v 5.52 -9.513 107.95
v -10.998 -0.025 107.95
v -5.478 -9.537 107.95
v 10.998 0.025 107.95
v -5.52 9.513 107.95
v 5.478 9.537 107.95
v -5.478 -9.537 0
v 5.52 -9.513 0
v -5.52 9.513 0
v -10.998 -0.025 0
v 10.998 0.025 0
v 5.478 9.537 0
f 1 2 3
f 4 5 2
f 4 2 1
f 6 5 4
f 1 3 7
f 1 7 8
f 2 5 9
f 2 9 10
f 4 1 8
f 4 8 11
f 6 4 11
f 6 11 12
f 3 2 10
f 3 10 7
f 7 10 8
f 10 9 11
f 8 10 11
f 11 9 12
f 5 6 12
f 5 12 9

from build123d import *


with BuildPart() as f2:
    # F2: sweep along a path in F1
    with BuildLine(Plane.YZ) as f2_path:
        Line((0, 0), (0, 107.95))
    # F0 (on Top) → F2 (sweep)
    with BuildSketch(Plane.XY):
        Polygon((5.520493, -9.51271), (10.998495, 0.024532), (5.478003, 9.537242), (-5.520493, 9.51271), (-10.998495, -0.024532), (-5.478003, -9.537242), align=None)
    sweep(path=f2_path.line)


solid = f2.part
